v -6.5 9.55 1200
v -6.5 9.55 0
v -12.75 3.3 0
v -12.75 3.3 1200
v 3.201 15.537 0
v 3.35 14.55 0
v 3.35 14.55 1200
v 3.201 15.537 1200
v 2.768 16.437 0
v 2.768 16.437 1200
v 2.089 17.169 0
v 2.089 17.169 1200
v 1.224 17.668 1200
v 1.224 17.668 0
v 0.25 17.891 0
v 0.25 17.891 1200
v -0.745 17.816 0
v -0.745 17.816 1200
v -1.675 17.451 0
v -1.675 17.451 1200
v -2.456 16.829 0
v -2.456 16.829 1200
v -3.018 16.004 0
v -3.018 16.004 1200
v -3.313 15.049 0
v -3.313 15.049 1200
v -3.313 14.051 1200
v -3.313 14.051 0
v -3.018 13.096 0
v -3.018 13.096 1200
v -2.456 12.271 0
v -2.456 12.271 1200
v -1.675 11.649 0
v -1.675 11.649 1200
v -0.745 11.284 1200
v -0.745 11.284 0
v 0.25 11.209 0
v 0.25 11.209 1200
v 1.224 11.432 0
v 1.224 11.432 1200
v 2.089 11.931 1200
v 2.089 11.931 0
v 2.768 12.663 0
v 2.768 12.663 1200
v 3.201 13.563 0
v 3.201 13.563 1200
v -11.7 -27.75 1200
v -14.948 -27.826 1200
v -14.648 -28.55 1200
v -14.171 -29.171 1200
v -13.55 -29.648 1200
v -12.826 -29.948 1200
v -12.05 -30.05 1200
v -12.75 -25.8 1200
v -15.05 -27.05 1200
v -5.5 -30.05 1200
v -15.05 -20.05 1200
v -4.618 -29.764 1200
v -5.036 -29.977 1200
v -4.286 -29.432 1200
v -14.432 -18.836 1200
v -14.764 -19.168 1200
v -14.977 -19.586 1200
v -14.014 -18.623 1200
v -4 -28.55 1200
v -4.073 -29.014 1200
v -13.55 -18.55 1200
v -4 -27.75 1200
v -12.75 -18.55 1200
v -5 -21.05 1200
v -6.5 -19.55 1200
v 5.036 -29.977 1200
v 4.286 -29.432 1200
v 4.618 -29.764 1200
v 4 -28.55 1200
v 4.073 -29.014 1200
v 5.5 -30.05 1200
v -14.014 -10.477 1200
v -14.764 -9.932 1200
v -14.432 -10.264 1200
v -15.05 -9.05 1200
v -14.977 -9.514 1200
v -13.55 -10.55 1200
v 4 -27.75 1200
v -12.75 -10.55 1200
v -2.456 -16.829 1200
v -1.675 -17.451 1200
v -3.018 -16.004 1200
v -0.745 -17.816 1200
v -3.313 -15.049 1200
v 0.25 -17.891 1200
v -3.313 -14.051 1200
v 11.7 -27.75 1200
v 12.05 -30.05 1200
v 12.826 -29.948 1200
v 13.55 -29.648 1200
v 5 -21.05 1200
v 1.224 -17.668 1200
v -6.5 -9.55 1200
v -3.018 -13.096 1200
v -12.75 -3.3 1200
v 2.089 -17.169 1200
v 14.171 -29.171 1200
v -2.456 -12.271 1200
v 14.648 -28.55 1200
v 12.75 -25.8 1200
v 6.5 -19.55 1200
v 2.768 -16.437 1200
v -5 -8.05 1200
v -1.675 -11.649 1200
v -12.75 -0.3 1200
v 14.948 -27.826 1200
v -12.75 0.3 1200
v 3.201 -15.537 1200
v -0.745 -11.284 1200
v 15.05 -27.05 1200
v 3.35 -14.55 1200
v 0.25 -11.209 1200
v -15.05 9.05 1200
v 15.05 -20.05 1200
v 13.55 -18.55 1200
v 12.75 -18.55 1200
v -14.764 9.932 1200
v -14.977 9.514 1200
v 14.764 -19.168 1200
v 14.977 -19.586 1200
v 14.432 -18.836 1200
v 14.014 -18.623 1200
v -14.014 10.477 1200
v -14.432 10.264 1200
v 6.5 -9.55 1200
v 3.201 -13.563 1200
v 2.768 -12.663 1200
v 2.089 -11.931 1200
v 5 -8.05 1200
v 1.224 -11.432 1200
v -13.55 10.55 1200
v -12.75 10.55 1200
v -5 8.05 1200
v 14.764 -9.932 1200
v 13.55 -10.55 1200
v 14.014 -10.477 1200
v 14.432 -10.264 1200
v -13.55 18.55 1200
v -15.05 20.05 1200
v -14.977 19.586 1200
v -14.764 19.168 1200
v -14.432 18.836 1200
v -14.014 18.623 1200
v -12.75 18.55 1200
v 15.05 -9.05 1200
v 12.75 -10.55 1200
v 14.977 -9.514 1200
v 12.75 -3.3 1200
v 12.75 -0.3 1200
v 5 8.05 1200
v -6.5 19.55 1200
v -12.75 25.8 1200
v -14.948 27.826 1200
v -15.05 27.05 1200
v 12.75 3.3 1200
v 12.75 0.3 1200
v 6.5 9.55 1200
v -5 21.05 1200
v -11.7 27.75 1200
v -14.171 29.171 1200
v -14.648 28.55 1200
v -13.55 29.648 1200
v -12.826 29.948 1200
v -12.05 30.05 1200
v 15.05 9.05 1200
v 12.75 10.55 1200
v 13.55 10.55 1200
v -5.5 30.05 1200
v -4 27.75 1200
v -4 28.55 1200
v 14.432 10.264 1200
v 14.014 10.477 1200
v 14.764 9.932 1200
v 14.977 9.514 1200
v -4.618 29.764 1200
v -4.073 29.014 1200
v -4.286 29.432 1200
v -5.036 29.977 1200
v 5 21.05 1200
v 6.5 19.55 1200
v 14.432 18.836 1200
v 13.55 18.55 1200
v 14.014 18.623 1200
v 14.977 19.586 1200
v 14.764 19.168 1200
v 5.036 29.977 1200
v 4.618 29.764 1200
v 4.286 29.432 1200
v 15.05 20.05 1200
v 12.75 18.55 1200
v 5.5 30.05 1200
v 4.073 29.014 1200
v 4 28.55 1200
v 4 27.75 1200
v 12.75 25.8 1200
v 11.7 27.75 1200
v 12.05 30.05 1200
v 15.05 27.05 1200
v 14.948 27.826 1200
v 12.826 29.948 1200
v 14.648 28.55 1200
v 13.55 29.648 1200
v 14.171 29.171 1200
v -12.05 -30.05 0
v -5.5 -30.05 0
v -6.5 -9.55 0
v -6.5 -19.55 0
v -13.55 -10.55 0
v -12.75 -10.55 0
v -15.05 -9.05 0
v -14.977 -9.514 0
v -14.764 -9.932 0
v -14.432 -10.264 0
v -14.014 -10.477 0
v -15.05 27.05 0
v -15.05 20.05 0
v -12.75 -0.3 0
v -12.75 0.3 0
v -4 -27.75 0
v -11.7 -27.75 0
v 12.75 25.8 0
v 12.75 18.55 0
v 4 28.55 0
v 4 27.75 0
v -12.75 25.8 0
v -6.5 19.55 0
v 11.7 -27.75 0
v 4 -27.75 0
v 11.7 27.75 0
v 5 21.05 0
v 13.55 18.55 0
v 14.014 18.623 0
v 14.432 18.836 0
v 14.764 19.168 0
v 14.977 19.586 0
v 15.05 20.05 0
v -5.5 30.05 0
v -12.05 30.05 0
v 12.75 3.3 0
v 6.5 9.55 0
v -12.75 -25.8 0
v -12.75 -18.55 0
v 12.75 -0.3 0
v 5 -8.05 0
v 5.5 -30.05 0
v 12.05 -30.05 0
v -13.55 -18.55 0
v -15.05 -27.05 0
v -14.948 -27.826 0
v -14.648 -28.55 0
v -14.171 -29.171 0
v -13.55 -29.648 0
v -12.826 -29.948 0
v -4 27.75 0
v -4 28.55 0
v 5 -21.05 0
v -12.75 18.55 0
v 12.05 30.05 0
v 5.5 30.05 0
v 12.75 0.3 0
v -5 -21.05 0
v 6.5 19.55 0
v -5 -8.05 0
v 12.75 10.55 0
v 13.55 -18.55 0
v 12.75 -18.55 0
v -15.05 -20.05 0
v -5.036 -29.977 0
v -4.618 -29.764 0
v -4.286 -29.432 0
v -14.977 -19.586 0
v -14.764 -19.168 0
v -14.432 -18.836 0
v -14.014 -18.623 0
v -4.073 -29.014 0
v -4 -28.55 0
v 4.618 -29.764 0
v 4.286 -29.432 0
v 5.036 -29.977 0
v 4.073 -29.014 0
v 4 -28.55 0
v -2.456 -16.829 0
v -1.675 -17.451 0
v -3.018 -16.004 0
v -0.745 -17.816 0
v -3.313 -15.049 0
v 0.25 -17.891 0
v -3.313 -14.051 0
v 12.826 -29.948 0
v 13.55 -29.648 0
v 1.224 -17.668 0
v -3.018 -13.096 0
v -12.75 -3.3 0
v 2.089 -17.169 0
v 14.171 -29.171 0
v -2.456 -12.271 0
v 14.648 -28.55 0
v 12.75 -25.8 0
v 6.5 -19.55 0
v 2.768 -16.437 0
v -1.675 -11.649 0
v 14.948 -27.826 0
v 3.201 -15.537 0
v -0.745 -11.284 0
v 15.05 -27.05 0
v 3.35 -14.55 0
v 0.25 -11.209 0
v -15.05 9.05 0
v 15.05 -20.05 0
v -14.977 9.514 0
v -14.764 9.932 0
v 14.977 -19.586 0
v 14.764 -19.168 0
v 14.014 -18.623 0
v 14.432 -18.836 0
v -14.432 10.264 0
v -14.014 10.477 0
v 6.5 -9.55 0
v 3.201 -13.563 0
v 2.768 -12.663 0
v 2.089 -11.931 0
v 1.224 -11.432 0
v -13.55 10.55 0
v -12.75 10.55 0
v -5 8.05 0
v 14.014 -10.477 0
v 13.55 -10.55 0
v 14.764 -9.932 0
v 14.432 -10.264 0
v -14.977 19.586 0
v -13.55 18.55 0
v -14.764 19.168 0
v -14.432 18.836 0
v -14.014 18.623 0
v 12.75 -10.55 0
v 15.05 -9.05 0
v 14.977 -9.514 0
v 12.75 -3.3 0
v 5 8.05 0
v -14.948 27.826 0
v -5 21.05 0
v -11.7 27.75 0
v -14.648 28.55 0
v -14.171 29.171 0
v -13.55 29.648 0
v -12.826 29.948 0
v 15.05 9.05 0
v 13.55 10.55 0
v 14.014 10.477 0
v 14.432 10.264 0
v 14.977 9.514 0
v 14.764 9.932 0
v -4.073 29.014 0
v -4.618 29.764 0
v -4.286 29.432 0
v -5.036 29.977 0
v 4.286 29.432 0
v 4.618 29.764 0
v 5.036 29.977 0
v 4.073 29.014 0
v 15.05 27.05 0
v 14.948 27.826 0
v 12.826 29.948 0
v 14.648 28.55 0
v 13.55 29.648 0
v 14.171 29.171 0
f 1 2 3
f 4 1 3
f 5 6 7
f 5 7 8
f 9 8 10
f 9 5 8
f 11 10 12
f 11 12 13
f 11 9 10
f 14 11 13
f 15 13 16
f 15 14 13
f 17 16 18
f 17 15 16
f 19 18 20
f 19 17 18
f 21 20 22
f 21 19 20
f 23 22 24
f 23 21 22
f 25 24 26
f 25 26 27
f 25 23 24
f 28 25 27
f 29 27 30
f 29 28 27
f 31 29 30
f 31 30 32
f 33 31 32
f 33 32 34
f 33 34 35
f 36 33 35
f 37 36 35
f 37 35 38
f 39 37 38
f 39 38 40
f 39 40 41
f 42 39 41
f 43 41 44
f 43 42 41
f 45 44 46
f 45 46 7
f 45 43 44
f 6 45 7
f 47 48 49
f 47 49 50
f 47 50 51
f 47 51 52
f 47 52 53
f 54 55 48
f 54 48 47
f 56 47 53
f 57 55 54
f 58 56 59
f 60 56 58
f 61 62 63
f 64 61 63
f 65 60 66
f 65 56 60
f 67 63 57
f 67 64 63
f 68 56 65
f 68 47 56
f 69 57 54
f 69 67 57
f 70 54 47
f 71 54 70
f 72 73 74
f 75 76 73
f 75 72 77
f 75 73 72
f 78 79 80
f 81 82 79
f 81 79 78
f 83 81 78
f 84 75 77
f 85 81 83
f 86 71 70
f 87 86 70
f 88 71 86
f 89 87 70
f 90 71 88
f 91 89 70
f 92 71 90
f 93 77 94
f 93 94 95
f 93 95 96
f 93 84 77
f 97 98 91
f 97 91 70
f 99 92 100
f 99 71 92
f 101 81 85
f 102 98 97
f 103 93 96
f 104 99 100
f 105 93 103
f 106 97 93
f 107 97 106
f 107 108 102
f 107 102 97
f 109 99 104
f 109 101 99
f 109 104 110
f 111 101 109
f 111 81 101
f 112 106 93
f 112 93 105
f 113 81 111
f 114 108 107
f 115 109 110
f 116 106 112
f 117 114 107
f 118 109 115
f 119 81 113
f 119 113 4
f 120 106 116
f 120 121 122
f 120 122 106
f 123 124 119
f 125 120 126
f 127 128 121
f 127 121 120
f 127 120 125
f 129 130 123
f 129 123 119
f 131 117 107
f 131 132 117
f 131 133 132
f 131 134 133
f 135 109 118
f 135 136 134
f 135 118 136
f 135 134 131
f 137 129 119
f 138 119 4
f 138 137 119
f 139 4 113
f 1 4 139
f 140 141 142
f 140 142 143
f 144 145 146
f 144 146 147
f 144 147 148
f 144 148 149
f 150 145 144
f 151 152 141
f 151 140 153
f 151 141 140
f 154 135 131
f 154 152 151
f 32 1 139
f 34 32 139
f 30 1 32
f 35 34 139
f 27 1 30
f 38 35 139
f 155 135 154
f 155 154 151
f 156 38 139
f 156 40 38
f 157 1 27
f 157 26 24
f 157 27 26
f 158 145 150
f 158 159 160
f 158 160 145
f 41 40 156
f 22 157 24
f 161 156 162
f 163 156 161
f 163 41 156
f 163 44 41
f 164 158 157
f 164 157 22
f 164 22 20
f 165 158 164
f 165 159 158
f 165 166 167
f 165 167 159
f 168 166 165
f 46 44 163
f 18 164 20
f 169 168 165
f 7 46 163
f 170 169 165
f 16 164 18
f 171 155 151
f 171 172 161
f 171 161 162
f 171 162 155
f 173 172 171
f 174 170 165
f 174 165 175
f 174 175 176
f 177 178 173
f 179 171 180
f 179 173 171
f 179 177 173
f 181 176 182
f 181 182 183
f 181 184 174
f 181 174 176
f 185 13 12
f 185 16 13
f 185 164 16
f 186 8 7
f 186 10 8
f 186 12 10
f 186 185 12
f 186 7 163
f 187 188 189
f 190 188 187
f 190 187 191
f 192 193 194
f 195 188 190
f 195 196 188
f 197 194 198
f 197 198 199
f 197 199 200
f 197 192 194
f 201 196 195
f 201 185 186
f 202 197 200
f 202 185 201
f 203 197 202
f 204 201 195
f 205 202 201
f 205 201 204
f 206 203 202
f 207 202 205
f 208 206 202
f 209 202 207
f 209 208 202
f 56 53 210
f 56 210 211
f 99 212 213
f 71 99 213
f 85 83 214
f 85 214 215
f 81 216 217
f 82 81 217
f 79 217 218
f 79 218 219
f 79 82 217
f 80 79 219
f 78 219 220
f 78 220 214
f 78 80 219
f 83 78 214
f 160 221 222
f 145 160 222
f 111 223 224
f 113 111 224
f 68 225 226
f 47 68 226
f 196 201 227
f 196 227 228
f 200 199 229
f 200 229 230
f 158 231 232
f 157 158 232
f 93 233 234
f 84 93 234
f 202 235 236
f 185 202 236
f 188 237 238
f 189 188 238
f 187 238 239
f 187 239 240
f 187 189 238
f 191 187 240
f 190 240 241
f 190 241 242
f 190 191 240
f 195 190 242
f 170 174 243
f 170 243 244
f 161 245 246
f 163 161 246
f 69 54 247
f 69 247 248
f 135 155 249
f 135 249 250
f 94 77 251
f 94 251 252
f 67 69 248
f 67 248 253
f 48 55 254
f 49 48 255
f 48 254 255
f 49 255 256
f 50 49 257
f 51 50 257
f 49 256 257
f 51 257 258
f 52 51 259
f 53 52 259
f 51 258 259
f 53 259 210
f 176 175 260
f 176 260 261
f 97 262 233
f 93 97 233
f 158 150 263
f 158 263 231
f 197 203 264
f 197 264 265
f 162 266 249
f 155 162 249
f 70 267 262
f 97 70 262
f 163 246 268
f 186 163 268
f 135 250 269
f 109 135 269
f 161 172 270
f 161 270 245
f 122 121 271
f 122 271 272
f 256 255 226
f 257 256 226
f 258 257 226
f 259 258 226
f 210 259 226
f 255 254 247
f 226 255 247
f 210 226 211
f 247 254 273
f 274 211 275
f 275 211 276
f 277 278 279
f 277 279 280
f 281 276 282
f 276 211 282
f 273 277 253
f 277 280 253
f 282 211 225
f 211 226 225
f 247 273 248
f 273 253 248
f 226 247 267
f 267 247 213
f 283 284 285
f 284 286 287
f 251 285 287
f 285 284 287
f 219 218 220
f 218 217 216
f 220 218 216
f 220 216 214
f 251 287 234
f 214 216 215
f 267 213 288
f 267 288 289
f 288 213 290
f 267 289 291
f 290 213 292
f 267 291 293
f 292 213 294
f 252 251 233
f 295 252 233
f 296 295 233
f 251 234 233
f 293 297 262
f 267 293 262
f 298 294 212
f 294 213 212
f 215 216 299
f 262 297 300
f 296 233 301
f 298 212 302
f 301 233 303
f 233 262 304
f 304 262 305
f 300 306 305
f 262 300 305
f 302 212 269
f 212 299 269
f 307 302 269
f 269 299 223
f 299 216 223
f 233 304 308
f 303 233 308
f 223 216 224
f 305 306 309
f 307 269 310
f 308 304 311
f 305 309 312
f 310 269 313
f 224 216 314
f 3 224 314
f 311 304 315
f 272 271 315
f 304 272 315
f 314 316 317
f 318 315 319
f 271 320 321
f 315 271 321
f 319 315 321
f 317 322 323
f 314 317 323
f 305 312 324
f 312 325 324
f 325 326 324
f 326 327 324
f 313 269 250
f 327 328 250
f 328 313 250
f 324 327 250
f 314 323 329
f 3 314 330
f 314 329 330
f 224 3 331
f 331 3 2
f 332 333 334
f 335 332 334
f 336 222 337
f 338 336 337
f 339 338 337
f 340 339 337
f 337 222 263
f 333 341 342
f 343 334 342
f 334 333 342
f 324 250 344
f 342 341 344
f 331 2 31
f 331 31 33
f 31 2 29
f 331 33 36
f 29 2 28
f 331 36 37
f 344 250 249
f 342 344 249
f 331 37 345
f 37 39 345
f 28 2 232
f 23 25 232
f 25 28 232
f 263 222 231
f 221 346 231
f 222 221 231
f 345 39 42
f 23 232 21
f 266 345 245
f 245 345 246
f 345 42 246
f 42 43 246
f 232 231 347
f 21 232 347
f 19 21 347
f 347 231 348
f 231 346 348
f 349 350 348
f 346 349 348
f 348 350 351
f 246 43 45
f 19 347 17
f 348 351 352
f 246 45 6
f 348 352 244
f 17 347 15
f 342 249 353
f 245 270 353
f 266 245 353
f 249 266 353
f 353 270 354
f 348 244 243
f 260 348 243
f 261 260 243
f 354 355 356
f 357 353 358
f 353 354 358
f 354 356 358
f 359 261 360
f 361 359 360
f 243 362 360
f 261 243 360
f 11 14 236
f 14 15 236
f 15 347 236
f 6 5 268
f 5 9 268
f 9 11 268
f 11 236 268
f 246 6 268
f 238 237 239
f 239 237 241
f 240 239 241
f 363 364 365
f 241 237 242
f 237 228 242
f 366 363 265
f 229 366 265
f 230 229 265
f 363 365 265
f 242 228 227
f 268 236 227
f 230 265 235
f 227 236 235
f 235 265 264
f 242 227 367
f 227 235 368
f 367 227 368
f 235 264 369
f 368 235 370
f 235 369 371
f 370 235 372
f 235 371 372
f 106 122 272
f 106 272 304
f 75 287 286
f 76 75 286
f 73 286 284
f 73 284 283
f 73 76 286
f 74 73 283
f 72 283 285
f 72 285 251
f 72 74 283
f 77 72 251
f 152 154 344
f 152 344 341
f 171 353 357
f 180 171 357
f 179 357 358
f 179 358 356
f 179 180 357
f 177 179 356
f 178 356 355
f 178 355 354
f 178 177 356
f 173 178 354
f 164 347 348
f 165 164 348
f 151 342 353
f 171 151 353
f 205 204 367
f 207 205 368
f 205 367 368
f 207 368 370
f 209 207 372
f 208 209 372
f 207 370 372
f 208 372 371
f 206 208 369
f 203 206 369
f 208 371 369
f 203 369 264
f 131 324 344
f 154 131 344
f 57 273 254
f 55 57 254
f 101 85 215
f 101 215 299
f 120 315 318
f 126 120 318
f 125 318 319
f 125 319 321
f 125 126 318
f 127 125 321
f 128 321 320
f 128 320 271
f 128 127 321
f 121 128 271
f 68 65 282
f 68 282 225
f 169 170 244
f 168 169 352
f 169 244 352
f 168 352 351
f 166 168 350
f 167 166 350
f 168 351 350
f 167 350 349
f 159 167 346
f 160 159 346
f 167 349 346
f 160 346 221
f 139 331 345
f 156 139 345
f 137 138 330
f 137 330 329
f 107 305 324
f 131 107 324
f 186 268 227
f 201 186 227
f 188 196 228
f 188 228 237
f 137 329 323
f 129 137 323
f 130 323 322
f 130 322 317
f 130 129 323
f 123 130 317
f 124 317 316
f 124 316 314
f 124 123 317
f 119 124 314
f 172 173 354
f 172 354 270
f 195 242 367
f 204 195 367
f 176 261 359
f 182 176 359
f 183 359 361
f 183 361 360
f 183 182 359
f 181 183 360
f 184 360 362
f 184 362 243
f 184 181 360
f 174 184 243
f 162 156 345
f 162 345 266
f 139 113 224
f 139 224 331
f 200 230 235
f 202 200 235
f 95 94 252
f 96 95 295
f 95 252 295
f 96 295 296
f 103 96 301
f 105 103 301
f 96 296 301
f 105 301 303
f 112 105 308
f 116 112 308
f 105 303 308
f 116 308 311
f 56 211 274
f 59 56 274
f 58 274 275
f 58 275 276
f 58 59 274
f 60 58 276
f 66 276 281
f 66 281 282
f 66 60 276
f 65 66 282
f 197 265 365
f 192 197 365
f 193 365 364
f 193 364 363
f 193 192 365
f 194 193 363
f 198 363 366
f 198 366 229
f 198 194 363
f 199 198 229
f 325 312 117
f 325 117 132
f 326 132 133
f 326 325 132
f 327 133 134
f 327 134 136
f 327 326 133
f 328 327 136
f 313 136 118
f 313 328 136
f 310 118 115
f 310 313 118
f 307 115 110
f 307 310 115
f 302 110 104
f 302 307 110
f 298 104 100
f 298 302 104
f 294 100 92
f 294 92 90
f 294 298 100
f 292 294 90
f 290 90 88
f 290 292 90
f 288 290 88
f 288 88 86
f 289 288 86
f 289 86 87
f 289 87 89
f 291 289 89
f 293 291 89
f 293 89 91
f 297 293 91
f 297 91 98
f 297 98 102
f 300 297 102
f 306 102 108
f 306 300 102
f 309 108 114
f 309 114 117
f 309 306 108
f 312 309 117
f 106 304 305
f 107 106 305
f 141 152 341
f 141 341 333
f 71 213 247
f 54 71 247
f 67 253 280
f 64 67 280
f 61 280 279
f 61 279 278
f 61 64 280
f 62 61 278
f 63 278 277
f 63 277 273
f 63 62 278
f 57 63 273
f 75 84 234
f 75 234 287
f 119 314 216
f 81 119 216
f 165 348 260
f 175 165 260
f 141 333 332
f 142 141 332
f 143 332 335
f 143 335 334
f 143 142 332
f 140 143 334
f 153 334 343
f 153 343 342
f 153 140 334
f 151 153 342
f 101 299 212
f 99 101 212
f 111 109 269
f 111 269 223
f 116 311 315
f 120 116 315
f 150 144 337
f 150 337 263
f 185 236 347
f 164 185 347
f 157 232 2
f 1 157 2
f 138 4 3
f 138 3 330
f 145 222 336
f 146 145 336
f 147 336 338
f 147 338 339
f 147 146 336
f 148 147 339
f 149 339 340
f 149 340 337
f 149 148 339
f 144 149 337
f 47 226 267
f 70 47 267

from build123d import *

# Parameters (mm, degrees)
CROQUIS1_R              = 3.35
SALIENTE_EXTRUIR1_DEPTH = 1200
REDONDEO1_R             = 1.5


with BuildPart() as part:
    # Croquis1 → Saliente-Extruir1 (new body)
    with BuildSketch(Plane.XY):
        with BuildLine():
            Line((-12.05, -30.05), (-4, -30.05))
            Line((-4, -30.05), (-4, -27.75))
            Line((-4, -27.75), (-11.7, -27.75))
            Line((-11.7, -27.75), (-5, -21.05))
            Line((-5, -21.05), (5, -21.05))
            Line((5, -21.05), (11.7, -27.75))
            Line((11.7, -27.75), (4, -27.75))
            Line((4, -27.75), (4, -30.05))
            Line((4, -30.05), (12.05, -30.05))
            ThreePointArc((12.05, -30.05), (14.171320344, -29.171320344), (15.05, -27.05))
            Line((15.05, -27.05), (15.05, -18.55))
            Line((15.05, -18.55), (12.75, -18.55))
            Line((12.75, -18.55), (12.75, -25.8))
            Line((12.75, -25.8), (6.5, -19.55))
            Line((6.5, -19.55), (6.5, -9.55))
            Line((6.5, -9.55), (12.75, -3.3))
            Line((12.75, -3.3), (12.75, -10.55))
            Line((12.75, -10.55), (15.05, -10.55))
            Line((15.05, -10.55), (15.05, 10.55))
            Line((15.05, 10.55), (12.75, 10.55))
            Line((12.75, 10.55), (12.75, 3.3))
            Line((12.75, 3.3), (6.5, 9.55))
            Line((6.5, 9.55), (6.5, 19.55))
            Line((6.5, 19.55), (12.75, 25.8))
            Line((12.75, 25.8), (12.75, 18.55))
            Line((12.75, 18.55), (15.05, 18.55))
            Line((15.05, 18.55), (15.05, 27.05))
            ThreePointArc((15.05, 27.05), (14.171320344, 29.171320344), (12.05, 30.05))
            Line((12.05, 30.05), (4, 30.05))
            Line((4, 30.05), (4, 27.75))
            Line((4, 27.75), (11.7, 27.75))
            Line((11.7, 27.75), (5, 21.05))
            Line((5, 21.05), (-5, 21.05))
            Line((-5, 21.05), (-11.7, 27.75))
            Line((-11.7, 27.75), (-4, 27.75))
            Line((-4, 27.75), (-4, 30.05))
            Line((-4, 30.05), (-12.05, 30.05))
            ThreePointArc((-12.05, 30.05), (-14.171320344, 29.171320344), (-15.05, 27.05))
            Line((-15.05, 27.05), (-15.05, 18.55))
            Line((-15.05, 18.55), (-12.75, 18.55))
            Line((-12.75, 18.55), (-12.75, 25.8))
            Line((-12.75, 25.8), (-6.5, 19.55))
            Line((-6.5, 19.55), (-6.5, 9.55))
            Line((-6.5, 9.55), (-12.75, 3.3))
            Line((-12.75, 3.3), (-12.75, 10.55))
            Line((-12.75, 10.55), (-15.05, 10.55))
            Line((-15.05, 10.55), (-15.05, -10.55))
            Line((-15.05, -10.55), (-12.75, -10.55))
            Line((-12.75, -10.55), (-12.75, -3.3))
            Line((-12.75, -3.3), (-6.5, -9.55))
            Line((-6.5, -9.55), (-6.5, -19.55))
            Line((-6.5, -19.55), (-12.75, -25.8))
            Line((-12.75, -25.8), (-12.75, -18.55))
            Line((-12.75, -18.55), (-15.05, -18.55))
            Line((-15.05, -18.55), (-15.05, -27.05))
            ThreePointArc((-15.05, -27.05), (-14.171320344, -29.171320344), (-12.05, -30.05))
        make_face()
        with Locations((0, 14.55)):
            Circle(CROQUIS1_R, mode=Mode.SUBTRACT)
        with Locations((0, -14.55)):
            Circle(CROQUIS1_R, mode=Mode.SUBTRACT)
        Polygon((-5, 8.05), (5, 8.05), (11.7, 1.35), (12.75, 0.3), (12.75, -0.3), (11.7, -1.35), (5, -8.05), (-5, -8.05), (-11.7, -1.35), (-12.75, -0.3), (-12.75, 0.3), (-11.7, 1.35), align=None, mode=Mode.SUBTRACT)
    extrude(amount=SALIENTE_EXTRUIR1_DEPTH)

    # Redondeo1
    redondeo1_edges = [part.edges().sort_by_distance(p)[0] for p in [
        (-4, 30.05, 600),
        (4, 30.05, 600),
        (15.05, 18.55, 600),
        (15.05, 10.55, 600),
        (15.05, -10.55, 600),
        (15.05, -18.55, 600),
        (4, -30.05, 600),
        (-4, -30.05, 600),
        (-15.05, -18.55, 600),
        (-15.05, -10.55, 600),
        (-15.05, 10.55, 600),
        (-15.05, 18.55, 600),
    ]]
    fillet(redondeo1_edges, radius=REDONDEO1_R)


solid = part.part
